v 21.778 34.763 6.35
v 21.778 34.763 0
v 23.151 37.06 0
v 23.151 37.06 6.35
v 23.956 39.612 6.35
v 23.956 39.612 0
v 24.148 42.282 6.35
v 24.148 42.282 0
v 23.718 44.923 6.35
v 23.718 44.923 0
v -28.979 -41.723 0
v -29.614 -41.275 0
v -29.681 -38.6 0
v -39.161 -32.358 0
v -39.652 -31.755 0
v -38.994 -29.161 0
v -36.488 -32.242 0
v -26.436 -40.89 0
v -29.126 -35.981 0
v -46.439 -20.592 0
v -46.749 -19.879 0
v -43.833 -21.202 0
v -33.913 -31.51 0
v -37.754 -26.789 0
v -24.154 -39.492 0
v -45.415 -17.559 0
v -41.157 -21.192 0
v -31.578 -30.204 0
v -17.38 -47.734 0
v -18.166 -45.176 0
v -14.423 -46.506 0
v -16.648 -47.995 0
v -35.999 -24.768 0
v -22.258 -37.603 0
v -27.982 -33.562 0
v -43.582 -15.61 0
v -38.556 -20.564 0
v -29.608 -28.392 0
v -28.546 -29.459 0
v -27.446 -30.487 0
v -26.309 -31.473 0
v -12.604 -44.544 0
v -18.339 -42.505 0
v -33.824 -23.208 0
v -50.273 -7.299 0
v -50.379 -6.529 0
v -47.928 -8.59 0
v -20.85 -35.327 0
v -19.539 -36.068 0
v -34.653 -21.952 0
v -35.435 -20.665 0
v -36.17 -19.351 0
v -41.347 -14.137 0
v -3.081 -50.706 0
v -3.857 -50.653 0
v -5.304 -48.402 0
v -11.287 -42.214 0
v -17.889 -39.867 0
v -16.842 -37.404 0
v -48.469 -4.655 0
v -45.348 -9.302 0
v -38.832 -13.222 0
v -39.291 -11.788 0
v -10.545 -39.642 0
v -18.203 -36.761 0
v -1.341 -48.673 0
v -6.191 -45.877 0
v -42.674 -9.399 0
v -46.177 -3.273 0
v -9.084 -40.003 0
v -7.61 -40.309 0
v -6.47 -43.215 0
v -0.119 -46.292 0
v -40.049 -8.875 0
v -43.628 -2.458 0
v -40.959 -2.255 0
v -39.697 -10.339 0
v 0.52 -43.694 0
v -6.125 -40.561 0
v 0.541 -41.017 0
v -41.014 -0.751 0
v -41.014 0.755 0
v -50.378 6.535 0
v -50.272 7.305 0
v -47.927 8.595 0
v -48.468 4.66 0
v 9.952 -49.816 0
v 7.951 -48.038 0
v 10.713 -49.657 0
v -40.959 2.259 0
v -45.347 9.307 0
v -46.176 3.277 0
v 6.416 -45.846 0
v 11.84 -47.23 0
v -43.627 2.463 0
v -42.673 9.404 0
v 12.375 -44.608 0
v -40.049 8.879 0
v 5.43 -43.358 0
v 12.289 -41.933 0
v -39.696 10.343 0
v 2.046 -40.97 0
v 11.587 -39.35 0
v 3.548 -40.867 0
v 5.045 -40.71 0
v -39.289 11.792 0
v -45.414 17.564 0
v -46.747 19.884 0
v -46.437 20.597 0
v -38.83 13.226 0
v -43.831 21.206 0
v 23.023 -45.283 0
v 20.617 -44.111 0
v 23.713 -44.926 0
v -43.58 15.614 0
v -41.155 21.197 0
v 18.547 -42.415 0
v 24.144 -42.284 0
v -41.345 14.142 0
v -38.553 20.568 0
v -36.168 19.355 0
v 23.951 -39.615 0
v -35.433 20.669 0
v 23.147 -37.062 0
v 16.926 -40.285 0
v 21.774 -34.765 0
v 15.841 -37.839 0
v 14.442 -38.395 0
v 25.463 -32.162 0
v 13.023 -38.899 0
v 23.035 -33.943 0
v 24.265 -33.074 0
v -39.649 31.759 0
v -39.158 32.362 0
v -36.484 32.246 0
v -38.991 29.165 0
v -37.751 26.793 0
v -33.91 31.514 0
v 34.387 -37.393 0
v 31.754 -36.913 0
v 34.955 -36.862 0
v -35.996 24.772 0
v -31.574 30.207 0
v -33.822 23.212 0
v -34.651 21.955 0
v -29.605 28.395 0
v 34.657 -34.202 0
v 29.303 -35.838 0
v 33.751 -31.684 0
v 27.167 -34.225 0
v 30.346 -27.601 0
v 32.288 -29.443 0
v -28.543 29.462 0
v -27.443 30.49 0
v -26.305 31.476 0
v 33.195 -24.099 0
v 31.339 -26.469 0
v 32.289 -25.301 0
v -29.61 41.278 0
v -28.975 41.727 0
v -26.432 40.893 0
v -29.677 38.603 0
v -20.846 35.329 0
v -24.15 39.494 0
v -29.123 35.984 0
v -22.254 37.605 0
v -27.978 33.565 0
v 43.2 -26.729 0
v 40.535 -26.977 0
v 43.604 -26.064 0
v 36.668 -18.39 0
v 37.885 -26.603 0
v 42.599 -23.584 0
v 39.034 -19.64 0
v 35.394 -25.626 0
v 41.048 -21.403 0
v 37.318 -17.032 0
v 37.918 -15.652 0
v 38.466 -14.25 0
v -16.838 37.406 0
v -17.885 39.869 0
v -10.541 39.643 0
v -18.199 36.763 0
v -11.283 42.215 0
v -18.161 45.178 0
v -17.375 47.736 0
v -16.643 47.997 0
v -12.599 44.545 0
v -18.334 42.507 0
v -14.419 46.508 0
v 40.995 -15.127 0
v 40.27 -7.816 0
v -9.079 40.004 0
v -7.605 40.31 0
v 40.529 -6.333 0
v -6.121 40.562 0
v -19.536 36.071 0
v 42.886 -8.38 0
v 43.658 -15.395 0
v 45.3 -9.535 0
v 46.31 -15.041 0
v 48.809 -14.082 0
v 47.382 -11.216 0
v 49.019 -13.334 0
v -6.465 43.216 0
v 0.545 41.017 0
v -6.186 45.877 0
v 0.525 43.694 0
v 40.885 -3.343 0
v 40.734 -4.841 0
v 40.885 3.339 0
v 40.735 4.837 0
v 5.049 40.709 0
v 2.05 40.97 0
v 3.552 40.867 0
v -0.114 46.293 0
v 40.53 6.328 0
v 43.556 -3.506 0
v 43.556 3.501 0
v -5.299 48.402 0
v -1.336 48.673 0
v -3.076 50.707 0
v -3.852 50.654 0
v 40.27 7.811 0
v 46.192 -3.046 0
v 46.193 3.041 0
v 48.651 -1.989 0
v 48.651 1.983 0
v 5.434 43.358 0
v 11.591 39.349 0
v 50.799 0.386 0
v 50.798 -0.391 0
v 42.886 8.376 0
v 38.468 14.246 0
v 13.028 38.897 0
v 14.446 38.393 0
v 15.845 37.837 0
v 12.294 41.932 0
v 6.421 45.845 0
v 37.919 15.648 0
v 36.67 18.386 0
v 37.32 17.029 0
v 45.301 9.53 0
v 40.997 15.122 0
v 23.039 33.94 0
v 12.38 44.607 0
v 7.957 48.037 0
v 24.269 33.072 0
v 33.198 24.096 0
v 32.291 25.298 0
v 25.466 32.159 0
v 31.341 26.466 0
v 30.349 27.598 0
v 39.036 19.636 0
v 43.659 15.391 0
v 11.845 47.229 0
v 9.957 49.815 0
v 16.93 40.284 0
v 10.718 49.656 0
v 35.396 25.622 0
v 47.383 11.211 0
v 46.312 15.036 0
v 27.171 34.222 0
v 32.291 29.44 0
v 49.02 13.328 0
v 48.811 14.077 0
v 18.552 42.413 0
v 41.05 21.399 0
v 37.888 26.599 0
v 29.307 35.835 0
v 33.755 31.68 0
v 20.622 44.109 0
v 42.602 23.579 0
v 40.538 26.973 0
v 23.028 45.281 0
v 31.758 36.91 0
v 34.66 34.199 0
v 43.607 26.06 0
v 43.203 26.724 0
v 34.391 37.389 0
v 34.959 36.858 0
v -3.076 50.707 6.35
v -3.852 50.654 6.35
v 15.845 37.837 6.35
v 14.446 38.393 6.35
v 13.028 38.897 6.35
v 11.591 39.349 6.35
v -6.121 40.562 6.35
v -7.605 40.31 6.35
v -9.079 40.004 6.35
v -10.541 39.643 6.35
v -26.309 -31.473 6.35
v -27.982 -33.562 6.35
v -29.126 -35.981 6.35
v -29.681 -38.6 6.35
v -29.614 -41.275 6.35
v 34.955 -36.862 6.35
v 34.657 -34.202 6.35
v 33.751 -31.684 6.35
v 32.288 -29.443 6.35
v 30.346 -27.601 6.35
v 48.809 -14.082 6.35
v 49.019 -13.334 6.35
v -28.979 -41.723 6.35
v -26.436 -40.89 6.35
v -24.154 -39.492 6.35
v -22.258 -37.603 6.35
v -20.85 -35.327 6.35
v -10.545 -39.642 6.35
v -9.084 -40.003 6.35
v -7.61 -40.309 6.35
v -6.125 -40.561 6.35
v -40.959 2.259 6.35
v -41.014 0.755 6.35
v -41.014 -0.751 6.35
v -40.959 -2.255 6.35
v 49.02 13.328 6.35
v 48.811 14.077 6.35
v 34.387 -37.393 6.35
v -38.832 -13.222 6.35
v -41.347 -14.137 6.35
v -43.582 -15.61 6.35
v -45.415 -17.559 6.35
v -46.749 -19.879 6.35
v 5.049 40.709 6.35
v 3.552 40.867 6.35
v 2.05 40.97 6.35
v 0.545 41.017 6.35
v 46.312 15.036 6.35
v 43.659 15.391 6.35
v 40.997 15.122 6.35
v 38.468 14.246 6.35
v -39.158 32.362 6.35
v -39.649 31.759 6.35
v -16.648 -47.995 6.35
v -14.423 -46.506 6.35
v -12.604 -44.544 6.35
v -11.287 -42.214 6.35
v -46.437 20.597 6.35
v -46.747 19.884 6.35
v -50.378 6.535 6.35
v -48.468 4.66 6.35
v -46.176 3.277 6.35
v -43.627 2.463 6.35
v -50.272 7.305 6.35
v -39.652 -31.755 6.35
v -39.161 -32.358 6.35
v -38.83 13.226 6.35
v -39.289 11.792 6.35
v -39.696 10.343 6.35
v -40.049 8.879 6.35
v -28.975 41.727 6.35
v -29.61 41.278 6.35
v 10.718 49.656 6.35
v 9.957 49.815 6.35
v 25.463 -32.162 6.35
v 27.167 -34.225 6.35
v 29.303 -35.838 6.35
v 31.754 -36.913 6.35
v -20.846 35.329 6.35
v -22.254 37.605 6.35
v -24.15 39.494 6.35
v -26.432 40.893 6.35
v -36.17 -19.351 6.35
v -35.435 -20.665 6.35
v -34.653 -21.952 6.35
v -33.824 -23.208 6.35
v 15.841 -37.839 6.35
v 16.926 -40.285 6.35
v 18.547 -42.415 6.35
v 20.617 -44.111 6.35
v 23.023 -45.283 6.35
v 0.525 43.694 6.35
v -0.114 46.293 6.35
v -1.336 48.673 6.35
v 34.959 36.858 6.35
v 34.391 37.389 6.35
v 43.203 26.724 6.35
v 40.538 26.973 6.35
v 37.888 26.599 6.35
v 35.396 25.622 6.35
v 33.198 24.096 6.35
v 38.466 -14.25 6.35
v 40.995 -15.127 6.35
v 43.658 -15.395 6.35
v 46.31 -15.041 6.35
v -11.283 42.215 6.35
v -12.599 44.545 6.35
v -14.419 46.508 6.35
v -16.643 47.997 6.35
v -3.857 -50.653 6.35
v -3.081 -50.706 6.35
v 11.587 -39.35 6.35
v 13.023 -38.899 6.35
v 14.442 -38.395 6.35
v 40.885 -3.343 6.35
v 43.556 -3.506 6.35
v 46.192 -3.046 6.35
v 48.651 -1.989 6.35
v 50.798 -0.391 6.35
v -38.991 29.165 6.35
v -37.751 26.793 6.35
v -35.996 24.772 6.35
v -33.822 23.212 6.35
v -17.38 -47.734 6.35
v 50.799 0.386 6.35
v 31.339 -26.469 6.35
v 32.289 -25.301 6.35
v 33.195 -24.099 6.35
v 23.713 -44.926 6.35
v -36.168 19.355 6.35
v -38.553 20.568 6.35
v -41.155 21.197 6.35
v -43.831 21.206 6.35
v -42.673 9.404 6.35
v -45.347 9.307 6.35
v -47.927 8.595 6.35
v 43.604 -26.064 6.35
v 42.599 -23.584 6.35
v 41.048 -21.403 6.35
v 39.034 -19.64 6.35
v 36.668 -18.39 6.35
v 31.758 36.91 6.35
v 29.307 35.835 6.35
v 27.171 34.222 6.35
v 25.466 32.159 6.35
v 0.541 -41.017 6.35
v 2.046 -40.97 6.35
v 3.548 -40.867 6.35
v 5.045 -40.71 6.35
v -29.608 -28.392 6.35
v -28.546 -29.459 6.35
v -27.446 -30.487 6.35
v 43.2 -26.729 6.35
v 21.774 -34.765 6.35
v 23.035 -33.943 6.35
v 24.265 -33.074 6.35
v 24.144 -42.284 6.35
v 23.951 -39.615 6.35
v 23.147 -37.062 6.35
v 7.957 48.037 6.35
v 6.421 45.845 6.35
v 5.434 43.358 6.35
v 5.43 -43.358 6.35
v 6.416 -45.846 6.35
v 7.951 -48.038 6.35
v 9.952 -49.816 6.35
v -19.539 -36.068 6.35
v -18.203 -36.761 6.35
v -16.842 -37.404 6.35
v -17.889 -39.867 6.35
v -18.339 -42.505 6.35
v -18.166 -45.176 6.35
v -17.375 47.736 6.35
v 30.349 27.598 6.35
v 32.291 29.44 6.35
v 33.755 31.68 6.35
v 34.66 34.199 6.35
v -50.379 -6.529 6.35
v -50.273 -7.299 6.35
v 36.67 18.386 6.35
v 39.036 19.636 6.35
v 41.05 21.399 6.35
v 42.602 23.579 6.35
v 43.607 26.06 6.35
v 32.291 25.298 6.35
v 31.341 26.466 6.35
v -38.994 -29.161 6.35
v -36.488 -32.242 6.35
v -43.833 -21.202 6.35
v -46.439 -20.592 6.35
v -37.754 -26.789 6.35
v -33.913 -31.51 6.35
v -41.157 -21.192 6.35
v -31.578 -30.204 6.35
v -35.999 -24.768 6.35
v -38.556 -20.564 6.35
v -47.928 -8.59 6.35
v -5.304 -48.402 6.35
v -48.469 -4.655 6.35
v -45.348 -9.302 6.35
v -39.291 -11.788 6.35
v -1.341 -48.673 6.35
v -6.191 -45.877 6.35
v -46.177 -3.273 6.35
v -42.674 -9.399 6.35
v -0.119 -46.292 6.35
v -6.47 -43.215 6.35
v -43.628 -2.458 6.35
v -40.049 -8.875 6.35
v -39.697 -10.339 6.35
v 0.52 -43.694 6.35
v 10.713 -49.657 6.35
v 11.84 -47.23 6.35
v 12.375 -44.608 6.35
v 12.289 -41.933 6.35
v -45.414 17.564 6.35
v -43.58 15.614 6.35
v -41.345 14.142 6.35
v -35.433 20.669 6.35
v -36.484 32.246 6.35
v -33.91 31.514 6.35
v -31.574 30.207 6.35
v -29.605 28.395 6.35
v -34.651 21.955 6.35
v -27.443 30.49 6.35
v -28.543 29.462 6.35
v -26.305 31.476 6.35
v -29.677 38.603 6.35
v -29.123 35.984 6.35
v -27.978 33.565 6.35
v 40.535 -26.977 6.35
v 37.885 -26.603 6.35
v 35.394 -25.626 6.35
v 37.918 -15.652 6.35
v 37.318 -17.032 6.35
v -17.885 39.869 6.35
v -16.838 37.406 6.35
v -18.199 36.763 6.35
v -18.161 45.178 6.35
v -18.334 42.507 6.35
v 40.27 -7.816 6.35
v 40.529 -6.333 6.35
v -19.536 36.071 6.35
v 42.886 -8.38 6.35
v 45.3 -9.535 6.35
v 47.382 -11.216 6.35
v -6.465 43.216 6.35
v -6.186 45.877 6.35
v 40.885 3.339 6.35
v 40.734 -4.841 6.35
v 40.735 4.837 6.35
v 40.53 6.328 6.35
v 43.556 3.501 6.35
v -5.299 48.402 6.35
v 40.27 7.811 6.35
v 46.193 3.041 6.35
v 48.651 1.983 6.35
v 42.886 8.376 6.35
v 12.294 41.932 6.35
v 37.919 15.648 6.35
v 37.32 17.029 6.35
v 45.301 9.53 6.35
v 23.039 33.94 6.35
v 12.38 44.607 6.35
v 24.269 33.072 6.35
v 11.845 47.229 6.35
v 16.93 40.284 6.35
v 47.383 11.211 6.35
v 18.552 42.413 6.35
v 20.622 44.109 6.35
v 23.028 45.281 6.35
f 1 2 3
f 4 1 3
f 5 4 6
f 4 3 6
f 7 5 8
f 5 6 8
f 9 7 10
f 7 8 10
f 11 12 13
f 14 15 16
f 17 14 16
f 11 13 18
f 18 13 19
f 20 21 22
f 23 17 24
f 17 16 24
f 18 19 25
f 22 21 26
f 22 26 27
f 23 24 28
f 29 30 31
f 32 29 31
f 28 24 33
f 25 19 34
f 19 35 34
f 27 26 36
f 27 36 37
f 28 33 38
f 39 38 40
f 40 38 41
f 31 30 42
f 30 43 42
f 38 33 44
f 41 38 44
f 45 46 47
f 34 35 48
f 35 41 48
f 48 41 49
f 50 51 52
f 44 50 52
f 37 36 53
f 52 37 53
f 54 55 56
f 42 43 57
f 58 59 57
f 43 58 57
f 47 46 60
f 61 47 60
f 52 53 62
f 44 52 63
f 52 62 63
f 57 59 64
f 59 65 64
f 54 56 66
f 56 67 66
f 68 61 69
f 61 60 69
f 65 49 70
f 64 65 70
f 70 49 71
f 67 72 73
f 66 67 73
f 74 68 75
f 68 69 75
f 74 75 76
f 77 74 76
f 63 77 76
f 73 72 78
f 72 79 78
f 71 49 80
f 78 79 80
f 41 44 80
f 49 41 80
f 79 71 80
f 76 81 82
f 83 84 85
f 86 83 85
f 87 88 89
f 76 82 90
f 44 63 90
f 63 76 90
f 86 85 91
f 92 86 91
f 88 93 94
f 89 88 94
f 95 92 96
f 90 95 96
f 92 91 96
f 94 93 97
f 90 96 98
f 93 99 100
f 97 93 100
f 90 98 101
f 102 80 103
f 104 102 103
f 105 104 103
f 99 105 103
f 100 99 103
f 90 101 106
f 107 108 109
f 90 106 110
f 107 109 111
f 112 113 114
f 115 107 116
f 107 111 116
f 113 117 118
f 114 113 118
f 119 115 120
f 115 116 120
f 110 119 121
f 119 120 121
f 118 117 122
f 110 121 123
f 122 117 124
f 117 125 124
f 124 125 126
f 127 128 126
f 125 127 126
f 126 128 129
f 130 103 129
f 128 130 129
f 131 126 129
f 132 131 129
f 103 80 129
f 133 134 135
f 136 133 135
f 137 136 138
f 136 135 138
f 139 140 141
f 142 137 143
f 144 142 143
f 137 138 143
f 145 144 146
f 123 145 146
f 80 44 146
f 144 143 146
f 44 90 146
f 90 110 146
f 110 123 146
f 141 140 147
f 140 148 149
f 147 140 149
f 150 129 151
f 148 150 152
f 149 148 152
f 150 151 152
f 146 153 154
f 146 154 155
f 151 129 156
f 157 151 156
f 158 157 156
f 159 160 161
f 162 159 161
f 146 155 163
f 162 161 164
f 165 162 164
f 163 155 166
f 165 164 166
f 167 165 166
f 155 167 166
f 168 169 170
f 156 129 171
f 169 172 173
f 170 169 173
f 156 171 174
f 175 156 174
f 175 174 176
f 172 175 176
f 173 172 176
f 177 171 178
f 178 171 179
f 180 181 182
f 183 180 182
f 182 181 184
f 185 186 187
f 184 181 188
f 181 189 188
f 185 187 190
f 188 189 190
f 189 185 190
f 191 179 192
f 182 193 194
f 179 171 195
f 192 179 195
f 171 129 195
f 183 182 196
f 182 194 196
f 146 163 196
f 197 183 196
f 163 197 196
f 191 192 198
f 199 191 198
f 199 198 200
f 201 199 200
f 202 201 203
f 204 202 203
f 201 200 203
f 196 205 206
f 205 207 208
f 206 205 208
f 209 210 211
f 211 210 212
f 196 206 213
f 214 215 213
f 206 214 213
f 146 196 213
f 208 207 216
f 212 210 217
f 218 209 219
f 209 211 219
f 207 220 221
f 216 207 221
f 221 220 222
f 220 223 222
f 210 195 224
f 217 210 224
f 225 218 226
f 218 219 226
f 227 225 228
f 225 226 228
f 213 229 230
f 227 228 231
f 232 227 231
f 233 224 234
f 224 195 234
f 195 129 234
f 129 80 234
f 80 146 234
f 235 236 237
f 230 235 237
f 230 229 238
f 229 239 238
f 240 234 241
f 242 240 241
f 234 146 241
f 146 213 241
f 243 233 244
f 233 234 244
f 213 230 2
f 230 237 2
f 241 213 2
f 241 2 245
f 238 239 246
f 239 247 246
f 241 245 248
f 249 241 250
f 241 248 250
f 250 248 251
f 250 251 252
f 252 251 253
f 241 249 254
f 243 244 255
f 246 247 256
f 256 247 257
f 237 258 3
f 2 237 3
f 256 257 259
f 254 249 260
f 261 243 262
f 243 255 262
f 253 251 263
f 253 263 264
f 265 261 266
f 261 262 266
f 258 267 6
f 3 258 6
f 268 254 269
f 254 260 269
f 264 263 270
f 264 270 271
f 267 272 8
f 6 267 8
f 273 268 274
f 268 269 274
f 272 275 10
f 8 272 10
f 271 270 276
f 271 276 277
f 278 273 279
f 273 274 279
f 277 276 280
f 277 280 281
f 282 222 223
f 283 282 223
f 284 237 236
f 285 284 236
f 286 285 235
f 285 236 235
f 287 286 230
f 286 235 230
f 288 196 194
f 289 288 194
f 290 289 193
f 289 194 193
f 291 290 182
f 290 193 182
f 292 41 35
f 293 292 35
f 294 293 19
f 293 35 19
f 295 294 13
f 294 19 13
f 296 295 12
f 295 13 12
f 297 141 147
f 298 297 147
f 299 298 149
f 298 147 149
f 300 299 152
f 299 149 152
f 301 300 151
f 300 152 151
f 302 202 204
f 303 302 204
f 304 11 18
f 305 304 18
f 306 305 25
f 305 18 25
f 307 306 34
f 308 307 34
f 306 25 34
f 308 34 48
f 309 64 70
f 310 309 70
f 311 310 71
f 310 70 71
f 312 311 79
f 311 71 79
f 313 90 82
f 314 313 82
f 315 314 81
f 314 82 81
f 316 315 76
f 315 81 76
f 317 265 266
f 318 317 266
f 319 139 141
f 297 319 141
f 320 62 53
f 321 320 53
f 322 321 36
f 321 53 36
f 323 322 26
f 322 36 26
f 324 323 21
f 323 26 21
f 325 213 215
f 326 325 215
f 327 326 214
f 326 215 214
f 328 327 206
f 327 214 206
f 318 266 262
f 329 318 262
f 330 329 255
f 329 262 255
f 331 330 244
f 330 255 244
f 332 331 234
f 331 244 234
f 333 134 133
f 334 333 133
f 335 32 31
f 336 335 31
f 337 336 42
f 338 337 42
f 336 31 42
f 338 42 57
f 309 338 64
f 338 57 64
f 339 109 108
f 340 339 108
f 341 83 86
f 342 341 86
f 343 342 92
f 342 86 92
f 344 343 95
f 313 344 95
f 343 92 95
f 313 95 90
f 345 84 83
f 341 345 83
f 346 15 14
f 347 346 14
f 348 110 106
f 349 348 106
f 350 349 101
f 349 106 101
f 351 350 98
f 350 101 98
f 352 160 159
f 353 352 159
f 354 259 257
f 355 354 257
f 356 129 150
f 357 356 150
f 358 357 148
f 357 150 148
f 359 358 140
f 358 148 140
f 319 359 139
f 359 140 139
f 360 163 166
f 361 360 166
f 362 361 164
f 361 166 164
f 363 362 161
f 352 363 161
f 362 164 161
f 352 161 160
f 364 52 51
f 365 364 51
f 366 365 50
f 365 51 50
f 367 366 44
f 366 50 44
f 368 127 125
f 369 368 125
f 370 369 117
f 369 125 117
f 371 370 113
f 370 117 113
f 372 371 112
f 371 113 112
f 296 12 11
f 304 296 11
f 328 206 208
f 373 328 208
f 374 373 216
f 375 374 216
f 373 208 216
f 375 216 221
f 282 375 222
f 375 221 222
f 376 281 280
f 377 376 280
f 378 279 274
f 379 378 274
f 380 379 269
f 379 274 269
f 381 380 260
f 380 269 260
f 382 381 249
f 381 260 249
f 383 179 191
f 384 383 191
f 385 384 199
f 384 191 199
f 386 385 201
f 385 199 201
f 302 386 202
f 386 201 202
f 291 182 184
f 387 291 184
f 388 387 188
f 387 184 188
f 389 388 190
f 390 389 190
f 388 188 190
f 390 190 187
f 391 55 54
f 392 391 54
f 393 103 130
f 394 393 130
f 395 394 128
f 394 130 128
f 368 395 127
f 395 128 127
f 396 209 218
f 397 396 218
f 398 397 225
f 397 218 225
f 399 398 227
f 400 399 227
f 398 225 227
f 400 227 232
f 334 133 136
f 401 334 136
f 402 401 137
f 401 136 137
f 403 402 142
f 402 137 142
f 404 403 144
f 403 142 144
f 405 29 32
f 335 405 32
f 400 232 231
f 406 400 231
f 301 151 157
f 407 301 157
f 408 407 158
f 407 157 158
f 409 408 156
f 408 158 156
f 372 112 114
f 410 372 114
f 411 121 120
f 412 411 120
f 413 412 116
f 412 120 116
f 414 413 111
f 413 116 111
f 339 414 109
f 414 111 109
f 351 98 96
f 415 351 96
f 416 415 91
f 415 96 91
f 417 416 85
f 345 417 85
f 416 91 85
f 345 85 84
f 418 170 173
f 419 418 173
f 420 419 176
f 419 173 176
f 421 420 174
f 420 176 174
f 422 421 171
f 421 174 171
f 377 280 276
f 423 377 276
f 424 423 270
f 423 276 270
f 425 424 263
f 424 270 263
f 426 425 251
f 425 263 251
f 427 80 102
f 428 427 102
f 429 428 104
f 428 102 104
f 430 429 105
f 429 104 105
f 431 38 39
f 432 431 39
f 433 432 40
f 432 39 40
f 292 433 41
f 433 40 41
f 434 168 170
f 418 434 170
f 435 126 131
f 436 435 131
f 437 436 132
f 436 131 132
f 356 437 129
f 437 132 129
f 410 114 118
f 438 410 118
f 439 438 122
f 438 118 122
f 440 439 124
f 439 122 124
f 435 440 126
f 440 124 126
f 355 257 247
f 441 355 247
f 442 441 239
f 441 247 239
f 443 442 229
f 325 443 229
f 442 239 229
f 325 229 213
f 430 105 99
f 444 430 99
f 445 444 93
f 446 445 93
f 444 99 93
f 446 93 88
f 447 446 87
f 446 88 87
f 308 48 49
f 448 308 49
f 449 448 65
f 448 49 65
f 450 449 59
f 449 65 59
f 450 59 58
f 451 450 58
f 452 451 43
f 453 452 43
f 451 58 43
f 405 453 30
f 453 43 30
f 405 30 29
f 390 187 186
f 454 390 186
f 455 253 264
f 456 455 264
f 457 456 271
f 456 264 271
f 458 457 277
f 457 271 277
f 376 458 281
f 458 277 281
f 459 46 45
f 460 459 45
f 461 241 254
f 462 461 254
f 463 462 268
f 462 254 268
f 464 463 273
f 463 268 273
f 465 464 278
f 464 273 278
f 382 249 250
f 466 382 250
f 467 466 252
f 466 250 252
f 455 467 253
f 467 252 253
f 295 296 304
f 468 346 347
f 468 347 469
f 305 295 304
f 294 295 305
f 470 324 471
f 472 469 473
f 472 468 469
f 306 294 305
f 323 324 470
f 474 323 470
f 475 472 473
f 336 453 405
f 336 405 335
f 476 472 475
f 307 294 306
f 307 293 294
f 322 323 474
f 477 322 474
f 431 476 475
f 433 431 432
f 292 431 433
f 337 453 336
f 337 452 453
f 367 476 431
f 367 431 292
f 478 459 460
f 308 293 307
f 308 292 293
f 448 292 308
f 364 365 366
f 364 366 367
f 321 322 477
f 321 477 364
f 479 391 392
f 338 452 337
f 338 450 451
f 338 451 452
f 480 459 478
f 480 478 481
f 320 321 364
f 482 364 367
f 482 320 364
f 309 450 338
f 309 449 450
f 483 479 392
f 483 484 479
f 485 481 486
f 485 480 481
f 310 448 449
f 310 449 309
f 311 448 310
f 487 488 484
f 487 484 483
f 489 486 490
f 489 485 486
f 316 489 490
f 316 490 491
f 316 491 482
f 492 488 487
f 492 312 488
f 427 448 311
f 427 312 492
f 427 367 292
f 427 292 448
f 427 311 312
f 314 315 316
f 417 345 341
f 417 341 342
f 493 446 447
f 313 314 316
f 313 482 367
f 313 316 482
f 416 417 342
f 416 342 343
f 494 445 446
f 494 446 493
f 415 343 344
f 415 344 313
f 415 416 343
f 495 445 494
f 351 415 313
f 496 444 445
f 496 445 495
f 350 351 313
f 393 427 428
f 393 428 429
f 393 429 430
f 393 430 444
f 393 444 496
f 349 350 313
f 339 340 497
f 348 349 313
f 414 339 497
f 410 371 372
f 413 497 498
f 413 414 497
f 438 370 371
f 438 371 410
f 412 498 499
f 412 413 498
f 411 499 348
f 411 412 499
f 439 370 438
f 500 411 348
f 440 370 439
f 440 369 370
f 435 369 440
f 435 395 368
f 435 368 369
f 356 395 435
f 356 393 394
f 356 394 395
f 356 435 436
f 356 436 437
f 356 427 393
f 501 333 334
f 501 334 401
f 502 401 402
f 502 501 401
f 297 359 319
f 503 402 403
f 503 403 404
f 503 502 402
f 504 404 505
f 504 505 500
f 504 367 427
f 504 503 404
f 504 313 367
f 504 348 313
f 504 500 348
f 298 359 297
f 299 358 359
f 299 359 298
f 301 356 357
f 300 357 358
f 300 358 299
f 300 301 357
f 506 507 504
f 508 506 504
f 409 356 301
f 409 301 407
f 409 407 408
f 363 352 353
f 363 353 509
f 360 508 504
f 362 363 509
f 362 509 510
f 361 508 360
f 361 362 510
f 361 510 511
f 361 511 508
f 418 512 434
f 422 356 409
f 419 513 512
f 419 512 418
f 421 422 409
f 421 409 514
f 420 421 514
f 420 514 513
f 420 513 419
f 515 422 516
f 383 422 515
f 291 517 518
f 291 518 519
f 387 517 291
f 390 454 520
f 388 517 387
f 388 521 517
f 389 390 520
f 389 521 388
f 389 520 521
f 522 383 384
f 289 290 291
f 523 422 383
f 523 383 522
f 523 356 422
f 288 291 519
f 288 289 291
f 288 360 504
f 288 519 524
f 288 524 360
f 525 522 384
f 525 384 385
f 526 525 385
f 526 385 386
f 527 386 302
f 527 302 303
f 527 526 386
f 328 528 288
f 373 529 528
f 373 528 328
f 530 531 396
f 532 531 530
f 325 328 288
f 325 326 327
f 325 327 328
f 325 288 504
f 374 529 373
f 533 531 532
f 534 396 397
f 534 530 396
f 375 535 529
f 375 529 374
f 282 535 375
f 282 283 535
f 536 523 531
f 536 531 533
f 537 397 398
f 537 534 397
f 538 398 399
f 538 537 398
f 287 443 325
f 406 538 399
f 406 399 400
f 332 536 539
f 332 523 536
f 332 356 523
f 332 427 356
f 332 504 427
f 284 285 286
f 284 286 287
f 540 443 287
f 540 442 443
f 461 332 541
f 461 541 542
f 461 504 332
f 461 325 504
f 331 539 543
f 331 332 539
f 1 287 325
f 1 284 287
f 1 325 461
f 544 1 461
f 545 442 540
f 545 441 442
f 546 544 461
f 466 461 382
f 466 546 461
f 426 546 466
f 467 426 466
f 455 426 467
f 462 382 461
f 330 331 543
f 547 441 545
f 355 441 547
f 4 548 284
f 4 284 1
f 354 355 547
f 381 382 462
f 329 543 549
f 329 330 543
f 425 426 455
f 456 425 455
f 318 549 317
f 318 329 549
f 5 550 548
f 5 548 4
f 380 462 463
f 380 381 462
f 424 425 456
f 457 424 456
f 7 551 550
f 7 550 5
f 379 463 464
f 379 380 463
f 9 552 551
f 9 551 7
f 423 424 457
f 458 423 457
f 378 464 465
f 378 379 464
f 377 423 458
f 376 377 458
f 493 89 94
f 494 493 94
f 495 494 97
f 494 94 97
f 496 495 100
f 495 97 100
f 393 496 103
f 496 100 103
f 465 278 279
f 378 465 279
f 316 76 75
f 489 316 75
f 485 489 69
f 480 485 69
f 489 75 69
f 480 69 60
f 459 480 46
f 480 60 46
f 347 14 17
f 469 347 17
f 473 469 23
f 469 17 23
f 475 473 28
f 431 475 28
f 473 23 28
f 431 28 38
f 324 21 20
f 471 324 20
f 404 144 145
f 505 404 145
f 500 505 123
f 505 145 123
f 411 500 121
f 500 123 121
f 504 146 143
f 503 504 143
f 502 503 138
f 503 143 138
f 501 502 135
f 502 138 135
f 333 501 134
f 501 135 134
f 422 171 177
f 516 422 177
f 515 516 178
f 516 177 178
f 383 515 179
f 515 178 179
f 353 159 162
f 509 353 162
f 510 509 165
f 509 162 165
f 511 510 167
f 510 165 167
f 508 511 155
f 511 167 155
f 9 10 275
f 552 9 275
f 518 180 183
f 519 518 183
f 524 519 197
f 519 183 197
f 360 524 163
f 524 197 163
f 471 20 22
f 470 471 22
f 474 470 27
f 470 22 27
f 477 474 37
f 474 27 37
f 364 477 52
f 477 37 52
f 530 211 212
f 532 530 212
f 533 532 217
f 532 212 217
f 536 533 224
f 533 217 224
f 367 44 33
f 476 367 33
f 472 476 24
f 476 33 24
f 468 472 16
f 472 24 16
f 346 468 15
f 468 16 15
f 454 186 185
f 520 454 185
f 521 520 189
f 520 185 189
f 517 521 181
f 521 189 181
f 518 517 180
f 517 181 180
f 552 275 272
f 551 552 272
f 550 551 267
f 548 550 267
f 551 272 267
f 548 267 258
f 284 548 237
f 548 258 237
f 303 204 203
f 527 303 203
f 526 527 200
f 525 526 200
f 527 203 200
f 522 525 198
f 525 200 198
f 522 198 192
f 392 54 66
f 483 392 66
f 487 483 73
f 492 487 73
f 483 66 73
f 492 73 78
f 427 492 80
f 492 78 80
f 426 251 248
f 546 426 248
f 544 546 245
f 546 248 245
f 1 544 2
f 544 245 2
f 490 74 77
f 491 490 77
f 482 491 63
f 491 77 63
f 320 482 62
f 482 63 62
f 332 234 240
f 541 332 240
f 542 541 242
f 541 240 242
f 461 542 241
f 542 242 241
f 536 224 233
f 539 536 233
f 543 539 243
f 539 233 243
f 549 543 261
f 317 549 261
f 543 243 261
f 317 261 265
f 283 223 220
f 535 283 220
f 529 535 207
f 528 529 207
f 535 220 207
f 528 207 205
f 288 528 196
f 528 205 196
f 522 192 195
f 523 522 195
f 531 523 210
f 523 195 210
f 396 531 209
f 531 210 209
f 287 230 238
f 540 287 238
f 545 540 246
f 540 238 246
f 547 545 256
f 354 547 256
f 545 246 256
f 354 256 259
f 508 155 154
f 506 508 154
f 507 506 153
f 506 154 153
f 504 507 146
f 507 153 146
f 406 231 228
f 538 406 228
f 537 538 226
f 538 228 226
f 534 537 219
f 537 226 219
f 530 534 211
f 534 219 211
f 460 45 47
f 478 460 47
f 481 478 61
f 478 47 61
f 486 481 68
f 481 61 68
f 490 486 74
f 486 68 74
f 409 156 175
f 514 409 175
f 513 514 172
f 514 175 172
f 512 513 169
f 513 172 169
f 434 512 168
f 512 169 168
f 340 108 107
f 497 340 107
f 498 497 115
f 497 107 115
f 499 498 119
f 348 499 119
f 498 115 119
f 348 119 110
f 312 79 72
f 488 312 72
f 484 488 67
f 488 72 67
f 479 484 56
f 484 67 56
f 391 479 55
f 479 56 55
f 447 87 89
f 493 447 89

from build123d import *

# Parameters (mm, degrees)
F1_DEPTH = 6.35


with BuildPart() as f1:
    # F0 (on Top) → F1 (new body)
    with BuildSketch(Plane.XY):
        with BuildLine():
            ThreePointArc((40.884538, -3.343206), (40.98687, -1.672995), (41.021, 0))
            ThreePointArc((41.021, 0), (40.986959, 1.670818), (40.884893, 3.338863))
            ThreePointArc((40.884893, 3.338863), (40.639225, 5.583533), (40.270414, 7.811285))
            ThreePointArc((40.270414, 7.811285), (39.500418, 11.065235), (38.467955, 14.24566))
            ThreePointArc((38.467955, 14.24566), (37.625793, 16.340812), (36.669618, 18.386449))
            ThreePointArc((36.669618, 18.386449), (35.050271, 21.311991), (33.198026, 24.095923))
            ThreePointArc((33.198026, 24.095923), (31.821828, 25.886168), (30.349205, 27.597975))
            ThreePointArc((30.349205, 27.597975), (28.000605, 29.978135), (25.465951, 32.159101))
            ThreePointArc((25.465951, 32.159101), (23.657784, 33.511665), (21.77793, 34.762684))
            ThreePointArc((21.77793, 34.762684), (18.874263, 36.420937), (15.845183, 37.837186))
            ThreePointArc((15.845183, 37.837186), (13.73915, 38.651756), (11.591485, 39.349205))
            ThreePointArc((11.591485, 39.349205), (8.348103, 40.162565), (5.04925, 40.709059))
            ThreePointArc((5.04925, 40.709059), (2.801546, 40.925222), (0.545353, 41.017375))
            ThreePointArc((0.545353, 41.017375), (-2.797198, 40.925519), (-6.121163, 40.561728))
            ThreePointArc((-6.121163, 40.561728), (-8.343836, 40.163452), (-10.541226, 39.643474))
            ThreePointArc((-10.541226, 39.643474), (-13.735043, 38.653215), (-16.837597, 37.40612))
            ThreePointArc((-16.837597, 37.40612), (-18.870393, 36.422942), (-20.84601, 35.329397))
            ThreePointArc((-20.84601, 35.329397), (-23.654223, 33.514179), (-26.305263, 31.47627))
            ThreePointArc((-26.305263, 31.47627), (-27.99742, 29.981109), (-29.60474, 28.395101))
            ThreePointArc((-29.60474, 28.395101), (-31.819078, 25.889549), (-33.821989, 23.211969))
            ThreePointArc((-33.821989, 23.211969), (-35.048006, 21.315715), (-36.167823, 19.354871))
            ThreePointArc((-36.167823, 19.354871), (-37.624057, 16.34481), (-38.830292, 13.226143))
            ThreePointArc((-38.830292, 13.226143), (-39.499242, 11.069432), (-40.048504, 8.879178))
            ThreePointArc((-40.048504, 8.879178), (-40.638631, 5.587851), (-40.95873, 2.259395))
            ThreePointArc((-40.95873, 2.259395), (-41.021, 0.002179), (-40.95897, -2.255043))
            ThreePointArc((-40.95897, -2.255043), (-40.639225, -5.583533), (-40.049447, -8.874923))
            ThreePointArc((-40.049447, -8.874923), (-39.500418, -11.065235), (-38.831697, -13.222018))
            ThreePointArc((-38.831697, -13.222018), (-37.625793, -16.340812), (-36.169879, -19.351028))
            ThreePointArc((-36.169879, -19.351028), (-35.050271, -21.311991), (-33.824454, -23.208376))
            ThreePointArc((-33.824454, -23.208376), (-31.821828, -25.886168), (-29.607757, -28.391956))
            ThreePointArc((-29.607757, -28.391956), (-28.000605, -29.978135), (-26.308607, -31.473475))
            ThreePointArc((-26.308607, -31.473475), (-23.657784, -33.511665), (-20.849763, -35.327183))
            ThreePointArc((-20.849763, -35.327183), (-18.874263, -36.420937), (-16.841571, -37.404331))
            ThreePointArc((-16.841571, -37.404331), (-13.73915, -38.651756), (-10.545437, -39.642354))
            ThreePointArc((-10.545437, -39.642354), (-8.348103, -40.162565), (-6.125472, -40.561078))
            ThreePointArc((-6.125472, -40.561078), (-2.801546, -40.925222), (0.540995, -41.017432))
            ThreePointArc((0.540995, -41.017432), (2.797198, -40.925519), (5.044925, -40.709596))
            ThreePointArc((5.044925, -40.709596), (8.343836, -40.163452), (11.587304, -39.350436))
            ThreePointArc((11.587304, -39.350436), (13.735043, -38.653215), (15.841163, -37.838869))
            ThreePointArc((15.841163, -37.838869), (18.870393, -36.422942), (21.774236, -34.764998))
            ThreePointArc((21.774236, -34.764998), (23.654223, -33.514179), (25.462534, -32.161806))
            ThreePointArc((25.462534, -32.161806), (27.99742, -29.981109), (30.346273, -27.601199))
            ThreePointArc((30.346273, -27.601199), (31.819078, -25.889549), (33.195466, -24.09945))
            ThreePointArc((33.195466, -24.09945), (35.048006, -21.315715), (36.667665, -18.390345))
            ThreePointArc((36.667665, -18.390345), (37.624057, -16.34481), (38.466442, -14.249747))
            ThreePointArc((38.466442, -14.249747), (39.499242, -11.069432), (40.269584, -7.815564))
            ThreePointArc((40.269584, -7.815564), (40.638631, -5.587851), (40.884538, -3.343206))
        make_face()
        with BuildLine():
            ThreePointArc((40.884893, 3.338863), (40.986959, 1.670818), (41.021, 0))
            ThreePointArc((41.021, 0), (40.98687, -1.672995), (40.884538, -3.343206))
            ThreePointArc((40.884538, -3.343206), (46.192352, -3.045646), (50.798492, -0.39142))
            Line((50.798492, -0.39142), (50.798533, 0.386023))
            ThreePointArc((50.798533, 0.386023), (46.192676, 3.040738), (40.884893, 3.338863))
        make_face()
        with BuildLine():
            ThreePointArc((38.467955, 14.24566), (39.500418, 11.065235), (40.270414, 7.811285))
            ThreePointArc((40.270414, 7.811285), (45.30112, 9.529843), (49.02035, 13.328364))
            Line((49.02035, 13.328364), (48.810638, 14.076988))
            ThreePointArc((48.810638, 14.076988), (43.659344, 15.390614), (38.467955, 14.24566))
        make_face()
        with BuildLine():
            ThreePointArc((49.018934, -13.333572), (45.300107, -9.534655), (40.269584, -7.815564))
            ThreePointArc((40.269584, -7.815564), (39.499242, -11.069432), (38.466442, -14.249747))
            ThreePointArc((38.466442, -14.249747), (43.657709, -15.395252), (48.809142, -14.082174))
            Line((48.809142, -14.082174), (49.018934, -13.333572))
        make_face()
        with BuildLine():
            ThreePointArc((33.198026, 24.095923), (35.050271, 21.311991), (36.669618, 18.386449))
            ThreePointArc((36.669618, 18.386449), (41.050111, 21.398546), (43.606593, 26.059645))
            Line((43.606593, 26.059645), (43.202681, 26.723928))
            ThreePointArc((43.202681, 26.723928), (37.888, 26.599039), (33.198026, 24.095923))
        make_face()
        with BuildLine():
            ThreePointArc((43.603824, -26.064277), (41.047837, -21.402907), (36.667665, -18.390345))
            ThreePointArc((36.667665, -18.390345), (35.048006, -21.315715), (33.195466, -24.09945))
            ThreePointArc((33.195466, -24.09945), (37.885174, -26.603064), (43.199842, -26.728518))
            Line((43.199842, -26.728518), (43.603824, -26.064277))
        make_face()
        with BuildLine():
            ThreePointArc((25.465951, 32.159101), (28.000605, 29.978135), (30.349205, 27.597975))
            ThreePointArc((30.349205, 27.597975), (33.754603, 31.680217), (34.958734, 36.8582))
            Line((34.958734, 36.8582), (34.390579, 37.388876))
            ThreePointArc((34.390579, 37.388876), (29.306675, 35.834734), (25.465951, 32.159101))
        make_face()
        with BuildLine():
            ThreePointArc((34.954818, -36.861914), (33.751237, -31.683803), (30.346273, -27.601199))
            ThreePointArc((30.346273, -27.601199), (27.99742, -29.981109), (25.462534, -32.161806))
            ThreePointArc((25.462534, -32.161806), (29.302868, -35.837847), (34.386607, -37.39253))
            Line((34.386607, -37.39253), (34.954818, -36.861914))
        make_face()
        with BuildLine():
            ThreePointArc((15.845183, 37.837186), (18.874263, 36.420937), (21.77793, 34.762684))
            ThreePointArc((21.77793, 34.762684), (23.95567, 39.612312), (23.718146, 44.923152))
            Line((23.718146, 44.923152), (23.027885, 45.280863))
            ThreePointArc((23.027885, 45.280863), (18.551808, 42.412731), (15.845183, 37.837186))
        make_face()
        with BuildLine():
            ThreePointArc((23.713373, -44.925671), (23.951462, -39.614856), (21.774236, -34.764998))
            ThreePointArc((21.774236, -34.764998), (18.870393, -36.422942), (15.841163, -37.838869))
            ThreePointArc((15.841163, -37.838869), (18.547303, -42.414702), (23.023074, -45.283309))
            Line((23.023074, -45.283309), (23.713373, -44.925671))
        make_face()
        with BuildLine():
            ThreePointArc((5.04925, 40.709059), (8.348103, 40.162565), (11.591485, 39.349205))
            ThreePointArc((11.591485, 39.349205), (12.380055, 44.606542), (10.718491, 49.656359))
            Line((10.718491, 49.656359), (9.957318, 49.814574))
            ThreePointArc((9.957318, 49.814574), (6.421039, 45.84517), (5.04925, 40.709059))
        make_face()
        with BuildLine():
            ThreePointArc((10.713216, -49.657497), (12.375316, -44.607857), (11.587304, -39.350436))
            ThreePointArc((11.587304, -39.350436), (8.343836, -40.163452), (5.044925, -40.709596))
            ThreePointArc((5.044925, -40.709596), (6.416169, -45.845852), (9.952026, -49.815632))
            Line((9.952026, -49.815632), (10.713216, -49.657497))
        make_face()
        with BuildLine():
            ThreePointArc((-6.121163, 40.561728), (-2.797198, 40.925519), (0.545353, 41.017375))
            ThreePointArc((0.545353, 41.017375), (-0.113732, 46.292509), (-3.076104, 50.70678))
            Line((-3.076104, 50.70678), (-3.851738, 50.653767))
            ThreePointArc((-3.851738, 50.653767), (-6.185949, 45.877482), (-6.121163, 40.561728))
        make_face()
        with BuildLine():
            ThreePointArc((-3.081491, -50.706453), (-0.11865, -46.292497), (0.540995, -41.017432))
            ThreePointArc((0.540995, -41.017432), (-2.801546, -40.925222), (-6.125472, -40.561078))
            ThreePointArc((-6.125472, -40.561078), (-6.190823, -45.876825), (-3.857119, -50.653358))
            Line((-3.857119, -50.653358), (-3.081491, -50.706453))
        make_face()
        with BuildLine():
            ThreePointArc((-16.837597, 37.40612), (-13.735043, 38.653215), (-10.541226, 39.643474))
            ThreePointArc((-10.541226, 39.643474), (-12.599084, 44.545173), (-16.64256, 47.996512))
            Line((-16.64256, 47.996512), (-17.375128, 47.736202))
            ThreePointArc((-17.375128, 47.736202), (-18.334154, 42.507272), (-16.837597, 37.40612))
        make_face()
        with BuildLine():
            ThreePointArc((-16.647659, -47.994744), (-12.603816, -44.543834), (-10.545437, -39.642354))
            ThreePointArc((-10.545437, -39.642354), (-13.73915, -38.651756), (-16.841571, -37.404331))
            ThreePointArc((-16.841571, -37.404331), (-18.33867, -42.505324), (-17.380199, -47.734355))
            Line((-17.380199, -47.734355), (-16.647659, -47.994744))
        make_face()
        with BuildLine():
            ThreePointArc((-26.305263, 31.47627), (-23.654223, 33.514179), (-20.84601, 35.329397))
            ThreePointArc((-20.84601, 35.329397), (-24.15002, 39.494125), (-28.974713, 41.726563))
            Line((-28.974713, 41.726563), (-29.609884, 41.27826))
            ThreePointArc((-29.609884, 41.27826), (-29.122599, 35.984491), (-26.305263, 31.47627))
        make_face()
        with BuildLine():
            ThreePointArc((-28.979145, -41.723484), (-24.154215, -39.491559), (-20.849763, -35.327183))
            ThreePointArc((-20.849763, -35.327183), (-23.657784, -33.511665), (-26.308607, -31.473475))
            ThreePointArc((-26.308607, -31.473475), (-29.126421, -35.981397), (-29.614269, -41.275115))
            Line((-29.614269, -41.275115), (-28.979145, -41.723484))
        make_face()
        with BuildLine():
            ThreePointArc((-33.821989, 23.211969), (-31.819078, 25.889549), (-29.60474, 28.395101))
            ThreePointArc((-29.60474, 28.395101), (-33.909859, 31.513978), (-39.157944, 32.361945))
            Line((-39.157944, 32.361945), (-39.64861, 31.7589))
            ThreePointArc((-39.64861, 31.7589), (-37.751153, 26.792906), (-33.821989, 23.211969))
        make_face()
        with BuildLine():
            ThreePointArc((-39.161381, -32.357784), (-33.913207, -31.510376), (-29.607757, -28.391956))
            ThreePointArc((-29.607757, -28.391956), (-31.821828, -25.886168), (-33.824454, -23.208376))
            ThreePointArc((-33.824454, -23.208376), (-37.753999, -26.788895), (-39.651984, -31.754687))
            Line((-39.651984, -31.754687), (-39.161381, -32.357784))
        make_face()
        with BuildLine():
            ThreePointArc((-38.830292, 13.226143), (-37.624057, 16.34481), (-36.167823, 19.354871))
            ThreePointArc((-36.167823, 19.354871), (-41.154759, 21.196584), (-46.437009, 20.597189))
            Line((-46.437009, 20.597189), (-46.746781, 19.884126))
            ThreePointArc((-46.746781, 19.884126), (-43.579877, 15.614213), (-38.830292, 13.226143))
        make_face()
        with BuildLine():
            ThreePointArc((-46.439197, -20.592256), (-41.157011, -21.192212), (-36.169879, -19.351028))
            ThreePointArc((-36.169879, -19.351028), (-37.625793, -16.340812), (-38.831697, -13.222018))
            ThreePointArc((-38.831697, -13.222018), (-43.581536, -15.609583), (-46.748893, -19.87916))
            Line((-46.748893, -19.87916), (-46.439197, -20.592256))
        make_face()
        with BuildLine():
            ThreePointArc((-40.95873, 2.259395), (-40.638631, 5.587851), (-40.048504, 8.879178))
            ThreePointArc((-40.048504, 8.879178), (-45.347399, 9.307136), (-50.272054, 7.304834))
            Line((-50.272054, 7.304834), (-50.377956, 6.534638))
            ThreePointArc((-50.377956, 6.534638), (-46.176482, 3.277485), (-40.95873, 2.259395))
        make_face()
        with BuildLine():
            ThreePointArc((-50.27283, -7.299494), (-45.348387, -9.302318), (-40.049447, -8.874923))
            ThreePointArc((-40.049447, -8.874923), (-40.639225, -5.583533), (-40.95897, -2.255043))
            ThreePointArc((-40.95897, -2.255043), (-46.17683, -3.27258), (-50.37865, -6.529286))
            Line((-50.37865, -6.529286), (-50.27283, -7.299494))
        make_face()
    extrude(amount=F1_DEPTH)


solid = f1.part
